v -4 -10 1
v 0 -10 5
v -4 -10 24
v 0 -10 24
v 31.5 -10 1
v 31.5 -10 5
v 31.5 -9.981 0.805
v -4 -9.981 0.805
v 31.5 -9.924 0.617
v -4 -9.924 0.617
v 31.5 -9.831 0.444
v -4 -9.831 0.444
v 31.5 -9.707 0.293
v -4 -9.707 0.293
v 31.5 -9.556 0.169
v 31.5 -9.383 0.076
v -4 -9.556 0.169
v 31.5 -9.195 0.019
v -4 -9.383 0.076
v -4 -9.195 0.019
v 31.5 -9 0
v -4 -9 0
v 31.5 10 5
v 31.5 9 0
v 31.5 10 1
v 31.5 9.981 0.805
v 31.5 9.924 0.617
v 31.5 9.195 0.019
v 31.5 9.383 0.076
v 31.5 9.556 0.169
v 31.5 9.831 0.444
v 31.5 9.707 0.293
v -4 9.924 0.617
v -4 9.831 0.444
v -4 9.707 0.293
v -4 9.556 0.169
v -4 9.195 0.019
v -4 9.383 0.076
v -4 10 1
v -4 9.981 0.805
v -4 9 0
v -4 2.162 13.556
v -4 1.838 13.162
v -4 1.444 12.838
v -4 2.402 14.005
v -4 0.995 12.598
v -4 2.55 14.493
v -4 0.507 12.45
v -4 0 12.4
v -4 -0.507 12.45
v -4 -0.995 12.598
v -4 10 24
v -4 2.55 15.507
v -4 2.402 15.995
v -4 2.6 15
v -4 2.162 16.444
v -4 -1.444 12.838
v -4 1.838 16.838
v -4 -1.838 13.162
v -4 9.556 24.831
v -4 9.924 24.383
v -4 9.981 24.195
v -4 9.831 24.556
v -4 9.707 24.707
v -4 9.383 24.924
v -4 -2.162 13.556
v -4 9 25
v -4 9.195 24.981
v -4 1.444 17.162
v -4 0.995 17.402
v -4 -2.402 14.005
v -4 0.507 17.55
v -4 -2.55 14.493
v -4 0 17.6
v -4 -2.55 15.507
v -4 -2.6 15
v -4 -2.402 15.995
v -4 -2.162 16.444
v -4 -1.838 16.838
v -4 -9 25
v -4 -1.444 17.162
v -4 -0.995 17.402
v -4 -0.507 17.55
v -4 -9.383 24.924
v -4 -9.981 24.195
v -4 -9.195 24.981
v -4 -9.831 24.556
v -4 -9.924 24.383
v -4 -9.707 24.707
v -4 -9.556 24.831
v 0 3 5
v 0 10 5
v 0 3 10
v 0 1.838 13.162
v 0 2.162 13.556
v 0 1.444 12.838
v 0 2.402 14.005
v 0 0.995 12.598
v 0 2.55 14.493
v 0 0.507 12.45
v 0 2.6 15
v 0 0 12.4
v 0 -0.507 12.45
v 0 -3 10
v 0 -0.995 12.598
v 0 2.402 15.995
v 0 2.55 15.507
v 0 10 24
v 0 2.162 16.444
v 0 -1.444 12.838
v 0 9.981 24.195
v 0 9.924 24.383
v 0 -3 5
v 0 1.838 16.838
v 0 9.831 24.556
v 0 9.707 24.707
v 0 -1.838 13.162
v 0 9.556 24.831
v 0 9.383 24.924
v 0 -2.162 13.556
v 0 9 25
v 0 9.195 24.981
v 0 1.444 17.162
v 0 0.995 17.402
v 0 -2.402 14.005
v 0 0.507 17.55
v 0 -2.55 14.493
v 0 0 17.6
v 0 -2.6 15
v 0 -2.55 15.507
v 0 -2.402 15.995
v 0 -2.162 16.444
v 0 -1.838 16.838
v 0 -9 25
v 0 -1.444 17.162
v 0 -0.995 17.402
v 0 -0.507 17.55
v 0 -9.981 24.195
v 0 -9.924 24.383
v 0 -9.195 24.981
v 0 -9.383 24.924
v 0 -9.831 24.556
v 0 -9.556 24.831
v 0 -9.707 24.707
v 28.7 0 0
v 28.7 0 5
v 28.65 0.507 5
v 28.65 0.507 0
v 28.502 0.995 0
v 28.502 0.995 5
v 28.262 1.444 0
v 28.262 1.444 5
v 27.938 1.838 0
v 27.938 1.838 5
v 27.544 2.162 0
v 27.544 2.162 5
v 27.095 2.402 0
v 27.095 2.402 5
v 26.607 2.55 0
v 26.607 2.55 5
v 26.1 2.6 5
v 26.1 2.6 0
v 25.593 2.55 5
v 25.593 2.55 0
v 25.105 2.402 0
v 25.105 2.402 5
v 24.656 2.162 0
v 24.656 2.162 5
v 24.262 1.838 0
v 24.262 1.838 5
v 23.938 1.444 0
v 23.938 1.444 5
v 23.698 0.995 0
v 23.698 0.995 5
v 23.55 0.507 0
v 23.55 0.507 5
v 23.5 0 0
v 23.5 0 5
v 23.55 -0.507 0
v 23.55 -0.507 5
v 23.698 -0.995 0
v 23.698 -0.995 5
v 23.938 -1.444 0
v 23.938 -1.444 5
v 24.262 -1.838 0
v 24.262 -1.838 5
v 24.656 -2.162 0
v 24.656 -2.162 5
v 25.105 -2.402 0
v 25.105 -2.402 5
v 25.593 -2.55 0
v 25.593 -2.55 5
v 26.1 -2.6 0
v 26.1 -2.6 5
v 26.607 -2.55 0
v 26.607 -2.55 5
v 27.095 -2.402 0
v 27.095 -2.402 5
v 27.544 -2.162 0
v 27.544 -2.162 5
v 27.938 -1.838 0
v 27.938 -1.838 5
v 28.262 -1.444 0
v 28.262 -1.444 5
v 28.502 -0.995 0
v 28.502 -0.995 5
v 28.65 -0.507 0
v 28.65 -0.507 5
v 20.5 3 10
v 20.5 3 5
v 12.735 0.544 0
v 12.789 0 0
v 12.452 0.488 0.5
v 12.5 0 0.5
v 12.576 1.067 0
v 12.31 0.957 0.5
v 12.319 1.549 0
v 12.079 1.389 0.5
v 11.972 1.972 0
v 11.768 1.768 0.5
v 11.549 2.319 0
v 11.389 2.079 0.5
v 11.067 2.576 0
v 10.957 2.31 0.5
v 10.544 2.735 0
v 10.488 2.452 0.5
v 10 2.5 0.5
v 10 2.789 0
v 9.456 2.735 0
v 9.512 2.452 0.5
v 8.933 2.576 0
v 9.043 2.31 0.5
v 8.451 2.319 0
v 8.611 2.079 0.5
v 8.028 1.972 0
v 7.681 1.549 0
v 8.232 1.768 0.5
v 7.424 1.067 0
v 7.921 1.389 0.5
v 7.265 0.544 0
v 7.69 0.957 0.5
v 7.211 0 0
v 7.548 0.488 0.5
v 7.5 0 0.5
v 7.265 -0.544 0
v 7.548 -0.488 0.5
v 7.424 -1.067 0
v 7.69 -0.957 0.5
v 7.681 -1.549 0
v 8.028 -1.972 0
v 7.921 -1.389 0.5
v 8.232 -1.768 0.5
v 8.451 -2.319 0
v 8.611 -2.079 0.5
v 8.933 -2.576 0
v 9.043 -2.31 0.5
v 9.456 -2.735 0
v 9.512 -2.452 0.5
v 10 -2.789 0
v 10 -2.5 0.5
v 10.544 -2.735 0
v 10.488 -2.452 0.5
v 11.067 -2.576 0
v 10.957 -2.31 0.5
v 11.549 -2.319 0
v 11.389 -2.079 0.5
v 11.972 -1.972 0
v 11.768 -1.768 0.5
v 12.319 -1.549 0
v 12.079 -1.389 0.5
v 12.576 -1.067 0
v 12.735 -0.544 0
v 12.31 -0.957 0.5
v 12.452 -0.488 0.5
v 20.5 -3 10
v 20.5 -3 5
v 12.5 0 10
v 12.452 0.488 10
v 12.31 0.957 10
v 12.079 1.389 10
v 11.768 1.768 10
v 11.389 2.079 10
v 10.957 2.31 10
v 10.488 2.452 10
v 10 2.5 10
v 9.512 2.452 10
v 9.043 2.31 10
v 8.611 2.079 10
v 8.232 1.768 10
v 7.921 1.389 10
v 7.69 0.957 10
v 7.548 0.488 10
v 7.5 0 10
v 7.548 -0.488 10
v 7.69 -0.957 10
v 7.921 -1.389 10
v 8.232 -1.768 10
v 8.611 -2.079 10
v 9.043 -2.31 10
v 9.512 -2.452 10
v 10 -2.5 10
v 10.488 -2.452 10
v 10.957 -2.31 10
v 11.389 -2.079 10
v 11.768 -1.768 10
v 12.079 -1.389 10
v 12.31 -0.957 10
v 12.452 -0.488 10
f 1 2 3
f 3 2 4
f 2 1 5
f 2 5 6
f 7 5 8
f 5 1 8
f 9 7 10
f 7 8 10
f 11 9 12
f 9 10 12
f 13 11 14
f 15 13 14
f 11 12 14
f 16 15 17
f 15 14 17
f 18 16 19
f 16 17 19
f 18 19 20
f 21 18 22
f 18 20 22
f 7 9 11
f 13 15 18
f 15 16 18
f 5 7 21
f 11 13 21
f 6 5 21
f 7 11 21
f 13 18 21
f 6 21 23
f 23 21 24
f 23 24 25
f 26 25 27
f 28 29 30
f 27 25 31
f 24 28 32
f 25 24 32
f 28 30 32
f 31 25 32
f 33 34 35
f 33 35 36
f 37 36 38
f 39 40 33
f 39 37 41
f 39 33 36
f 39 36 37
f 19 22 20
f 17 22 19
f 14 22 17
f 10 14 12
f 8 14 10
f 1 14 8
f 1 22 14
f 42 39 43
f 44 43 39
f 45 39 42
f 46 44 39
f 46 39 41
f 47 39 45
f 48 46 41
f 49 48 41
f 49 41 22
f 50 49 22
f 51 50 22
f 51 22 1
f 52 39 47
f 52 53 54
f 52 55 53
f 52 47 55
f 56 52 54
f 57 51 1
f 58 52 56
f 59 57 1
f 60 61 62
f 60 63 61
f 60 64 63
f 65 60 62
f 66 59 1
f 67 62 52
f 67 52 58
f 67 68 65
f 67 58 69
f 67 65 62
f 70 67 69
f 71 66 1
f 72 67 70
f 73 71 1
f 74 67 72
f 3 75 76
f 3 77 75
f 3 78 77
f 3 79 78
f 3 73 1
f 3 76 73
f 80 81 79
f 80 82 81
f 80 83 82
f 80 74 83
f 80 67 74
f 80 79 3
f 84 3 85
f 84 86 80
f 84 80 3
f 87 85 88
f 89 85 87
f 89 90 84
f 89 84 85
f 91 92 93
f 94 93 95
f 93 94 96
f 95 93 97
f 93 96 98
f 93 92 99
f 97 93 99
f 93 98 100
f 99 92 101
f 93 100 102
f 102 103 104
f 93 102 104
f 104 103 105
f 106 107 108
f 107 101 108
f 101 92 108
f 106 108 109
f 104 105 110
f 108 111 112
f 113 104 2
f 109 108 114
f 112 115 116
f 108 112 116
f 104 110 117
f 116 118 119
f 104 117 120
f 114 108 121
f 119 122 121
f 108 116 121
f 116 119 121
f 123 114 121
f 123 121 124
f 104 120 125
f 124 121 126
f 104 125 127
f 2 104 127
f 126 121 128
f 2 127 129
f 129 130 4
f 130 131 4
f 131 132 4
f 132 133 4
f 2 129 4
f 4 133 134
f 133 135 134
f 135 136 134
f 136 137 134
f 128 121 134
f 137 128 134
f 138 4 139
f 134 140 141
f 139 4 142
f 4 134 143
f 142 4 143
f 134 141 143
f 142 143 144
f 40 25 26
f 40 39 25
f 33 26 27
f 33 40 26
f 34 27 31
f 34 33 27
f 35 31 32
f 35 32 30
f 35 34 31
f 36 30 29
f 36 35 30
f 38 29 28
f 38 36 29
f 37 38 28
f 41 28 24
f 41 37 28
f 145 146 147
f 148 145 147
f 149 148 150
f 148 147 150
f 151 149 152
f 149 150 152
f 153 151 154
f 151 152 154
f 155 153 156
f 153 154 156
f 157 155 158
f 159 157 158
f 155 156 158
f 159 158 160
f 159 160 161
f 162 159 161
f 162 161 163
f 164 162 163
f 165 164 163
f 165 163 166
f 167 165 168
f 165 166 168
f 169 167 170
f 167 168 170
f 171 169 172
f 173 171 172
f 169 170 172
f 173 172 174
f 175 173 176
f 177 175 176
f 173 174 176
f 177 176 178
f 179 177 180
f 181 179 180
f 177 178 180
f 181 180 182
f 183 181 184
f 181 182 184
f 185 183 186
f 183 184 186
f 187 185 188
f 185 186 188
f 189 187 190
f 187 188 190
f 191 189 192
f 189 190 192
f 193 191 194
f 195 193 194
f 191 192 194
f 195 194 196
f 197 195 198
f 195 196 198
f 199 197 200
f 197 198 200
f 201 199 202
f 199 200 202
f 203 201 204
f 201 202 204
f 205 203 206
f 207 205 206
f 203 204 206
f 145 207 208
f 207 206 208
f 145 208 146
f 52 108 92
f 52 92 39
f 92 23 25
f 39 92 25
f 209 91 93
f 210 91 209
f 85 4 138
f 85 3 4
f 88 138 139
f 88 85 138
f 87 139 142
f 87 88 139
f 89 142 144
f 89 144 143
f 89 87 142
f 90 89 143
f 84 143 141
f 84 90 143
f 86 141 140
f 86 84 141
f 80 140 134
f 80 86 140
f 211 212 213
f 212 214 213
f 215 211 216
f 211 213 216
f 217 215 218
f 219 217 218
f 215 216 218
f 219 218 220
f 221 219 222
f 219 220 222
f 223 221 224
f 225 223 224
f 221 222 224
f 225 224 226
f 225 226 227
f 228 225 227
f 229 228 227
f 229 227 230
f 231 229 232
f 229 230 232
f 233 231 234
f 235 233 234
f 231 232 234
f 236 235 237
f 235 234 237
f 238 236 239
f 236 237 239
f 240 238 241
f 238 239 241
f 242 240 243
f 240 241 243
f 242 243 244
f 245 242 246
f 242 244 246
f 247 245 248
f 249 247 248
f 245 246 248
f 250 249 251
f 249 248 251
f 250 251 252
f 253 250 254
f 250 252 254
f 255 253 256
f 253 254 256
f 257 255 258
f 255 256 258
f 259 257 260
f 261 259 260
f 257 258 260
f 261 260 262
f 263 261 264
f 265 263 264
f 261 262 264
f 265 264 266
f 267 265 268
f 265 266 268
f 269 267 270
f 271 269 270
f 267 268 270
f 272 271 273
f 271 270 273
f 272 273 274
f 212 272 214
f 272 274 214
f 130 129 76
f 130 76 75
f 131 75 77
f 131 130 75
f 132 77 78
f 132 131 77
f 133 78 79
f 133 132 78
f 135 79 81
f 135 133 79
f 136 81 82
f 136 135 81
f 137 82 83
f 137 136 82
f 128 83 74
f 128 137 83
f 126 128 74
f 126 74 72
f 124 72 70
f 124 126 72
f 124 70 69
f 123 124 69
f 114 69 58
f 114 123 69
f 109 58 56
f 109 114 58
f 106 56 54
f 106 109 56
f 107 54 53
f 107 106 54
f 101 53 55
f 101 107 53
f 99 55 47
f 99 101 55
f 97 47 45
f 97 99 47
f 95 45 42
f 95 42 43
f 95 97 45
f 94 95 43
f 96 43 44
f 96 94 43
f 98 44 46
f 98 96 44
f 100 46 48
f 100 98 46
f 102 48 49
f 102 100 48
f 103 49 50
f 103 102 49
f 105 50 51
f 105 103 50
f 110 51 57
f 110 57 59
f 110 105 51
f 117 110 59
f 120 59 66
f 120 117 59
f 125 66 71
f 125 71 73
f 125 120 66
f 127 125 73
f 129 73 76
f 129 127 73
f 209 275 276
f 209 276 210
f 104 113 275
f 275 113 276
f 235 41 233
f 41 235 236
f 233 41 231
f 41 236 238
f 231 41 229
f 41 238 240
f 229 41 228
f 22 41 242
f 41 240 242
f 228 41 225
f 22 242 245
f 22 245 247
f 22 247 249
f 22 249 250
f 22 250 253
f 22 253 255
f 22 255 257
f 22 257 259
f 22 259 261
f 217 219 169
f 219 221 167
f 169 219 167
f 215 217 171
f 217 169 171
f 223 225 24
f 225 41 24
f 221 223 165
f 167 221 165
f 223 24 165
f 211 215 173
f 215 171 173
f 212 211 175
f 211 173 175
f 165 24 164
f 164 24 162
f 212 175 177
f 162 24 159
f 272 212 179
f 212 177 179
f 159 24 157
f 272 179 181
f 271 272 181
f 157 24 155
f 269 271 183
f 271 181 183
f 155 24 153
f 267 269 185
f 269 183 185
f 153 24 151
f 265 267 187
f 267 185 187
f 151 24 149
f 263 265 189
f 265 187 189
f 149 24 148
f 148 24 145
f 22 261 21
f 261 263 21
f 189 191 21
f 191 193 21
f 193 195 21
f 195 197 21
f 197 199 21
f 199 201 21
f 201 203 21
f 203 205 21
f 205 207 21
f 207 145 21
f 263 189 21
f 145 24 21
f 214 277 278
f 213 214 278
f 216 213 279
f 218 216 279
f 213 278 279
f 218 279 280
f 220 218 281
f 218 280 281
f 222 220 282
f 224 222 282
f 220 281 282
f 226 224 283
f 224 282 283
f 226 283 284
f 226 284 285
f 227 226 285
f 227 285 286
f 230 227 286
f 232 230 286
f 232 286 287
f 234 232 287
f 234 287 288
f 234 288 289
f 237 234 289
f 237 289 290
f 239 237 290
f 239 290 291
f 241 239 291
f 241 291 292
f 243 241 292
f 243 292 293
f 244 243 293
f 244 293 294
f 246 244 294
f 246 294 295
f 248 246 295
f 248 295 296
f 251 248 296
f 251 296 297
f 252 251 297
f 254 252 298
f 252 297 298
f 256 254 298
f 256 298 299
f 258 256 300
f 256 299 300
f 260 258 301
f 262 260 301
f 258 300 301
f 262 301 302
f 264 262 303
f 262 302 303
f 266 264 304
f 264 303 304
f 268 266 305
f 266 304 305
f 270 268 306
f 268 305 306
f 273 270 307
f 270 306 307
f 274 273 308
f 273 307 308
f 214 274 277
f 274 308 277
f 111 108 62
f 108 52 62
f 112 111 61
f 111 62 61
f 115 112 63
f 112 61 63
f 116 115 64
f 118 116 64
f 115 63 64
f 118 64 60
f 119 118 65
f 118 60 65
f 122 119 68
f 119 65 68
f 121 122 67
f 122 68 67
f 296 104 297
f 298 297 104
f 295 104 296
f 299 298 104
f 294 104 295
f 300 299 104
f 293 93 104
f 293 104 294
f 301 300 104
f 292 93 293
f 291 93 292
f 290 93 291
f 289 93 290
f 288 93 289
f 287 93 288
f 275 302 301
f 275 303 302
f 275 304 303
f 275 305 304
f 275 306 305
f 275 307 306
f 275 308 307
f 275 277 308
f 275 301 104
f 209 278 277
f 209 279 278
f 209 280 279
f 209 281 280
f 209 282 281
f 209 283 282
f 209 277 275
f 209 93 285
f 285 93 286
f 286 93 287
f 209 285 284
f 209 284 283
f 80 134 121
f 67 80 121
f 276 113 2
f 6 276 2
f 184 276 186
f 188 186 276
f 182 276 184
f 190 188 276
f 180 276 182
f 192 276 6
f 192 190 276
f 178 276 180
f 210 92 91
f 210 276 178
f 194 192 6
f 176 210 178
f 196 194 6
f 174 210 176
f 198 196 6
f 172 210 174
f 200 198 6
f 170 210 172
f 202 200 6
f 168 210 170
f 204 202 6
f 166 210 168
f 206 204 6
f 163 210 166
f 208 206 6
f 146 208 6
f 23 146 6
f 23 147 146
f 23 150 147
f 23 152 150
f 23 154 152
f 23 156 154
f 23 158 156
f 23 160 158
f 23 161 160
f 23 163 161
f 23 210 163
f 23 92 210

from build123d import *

# Parameters (mm, degrees)
F0_W      = 31.5
F0_H      = 20
F1_DEPTH  = 5
F2_W      = 31.5
F2_H      = 6
F3_DEPTH  = 5
F4_R      = 2.5
F5_DEPTH  = 25
F6_W      = 11.2
F6_H      = 6
F7_DEPTH  = 5
F8_R      = 2.6
F9_DEPTH  = 5
F10_R     = 2.6
F11_DEPTH = 4
F12_R     = 1


# Not quite as in the source:
# - a fillet or chamfer that OpenCascade refuses, or shapes differently, is made with other operations: its cross-section is extruded or revolved along the edge and cut away or added
# - a feature names something its author has since deleted; it is built from what else it names


with BuildPart() as f1:
    # F0 (on Top) → F1 (new body)
    with BuildSketch(Plane.XY):
        with Locations((15.75, 0)):
            Rectangle(F0_W, F0_H)
    extrude(amount=F1_DEPTH)

    # F2 (on face) → F3 (join)
    with BuildSketch(Plane.XY.offset(5)):
        with Locations((15.75, 0)):
            Rectangle(F2_W, F2_H)
    extrude(amount=F3_DEPTH)

    # F4 (on face) → F5 (cut)
    with BuildSketch(Plane.XY.offset(10)):
        with Locations((10, 0)):
            Circle(F4_R)
    extrude(amount=-F5_DEPTH, mode=Mode.SUBTRACT)

    # F6 (on face) → F7 (cut, through all)
    with BuildSketch(Plane.XY.offset(10)):
        with Locations((26.1, 0)):
            Rectangle(F6_W, F6_H)
    extrude(amount=-F7_DEPTH, mode=Mode.SUBTRACT)

    # F8 (on face) → F9 (cut, through all)
    with BuildSketch(Plane.XY.offset(5)):
        with Locations((26.1, 0)):
            Circle(F8_R)
    extrude(amount=-F9_DEPTH, mode=Mode.SUBTRACT)

    # F10 (on face) → F11 (join)
    with BuildSketch(Plane(origin=(0, 0, 0), x_dir=(0, -1, 0), z_dir=(-1, 0, 0))):
        Polygon((-10, 25), (-10, 5), (-3, 5), (-3, 10), (3, 10), (3, 5), (10, 5), (10, 25), align=None)
        with Locations((0, 15)):
            Circle(F10_R, mode=Mode.SUBTRACT)
        Polygon((-10, 5), (-10, 0), (10, 0), (10, 5), (3, 5), (3, 10), (-3, 10), (-3, 5), align=None)
    extrude(amount=F11_DEPTH)

    # F12
    f12_edges = [f1.edges().sort_by_distance(p)[0] for p in [
        (-2, -10, 25),
        (-2, 10, 25),
        (13.75, -10, 0),
        (13.75, 10, 0),
    ]]
    fillet(f12_edges, radius=F12_R)

    # F13: chamfer of 0.5 x 0.2886751346 on 1 edges, made by hand

    # F13_s1 → F13_t2 (revolve, cut)
    with BuildSketch(Plane.XZ):
        Polygon((12.7886751346, 0), (12.5, 0.5), (12.5, 0), align=None)
    revolve(axis=Axis((10, 0, 0), (0, 0, 1)), mode=Mode.SUBTRACT)


solid = f1.part
